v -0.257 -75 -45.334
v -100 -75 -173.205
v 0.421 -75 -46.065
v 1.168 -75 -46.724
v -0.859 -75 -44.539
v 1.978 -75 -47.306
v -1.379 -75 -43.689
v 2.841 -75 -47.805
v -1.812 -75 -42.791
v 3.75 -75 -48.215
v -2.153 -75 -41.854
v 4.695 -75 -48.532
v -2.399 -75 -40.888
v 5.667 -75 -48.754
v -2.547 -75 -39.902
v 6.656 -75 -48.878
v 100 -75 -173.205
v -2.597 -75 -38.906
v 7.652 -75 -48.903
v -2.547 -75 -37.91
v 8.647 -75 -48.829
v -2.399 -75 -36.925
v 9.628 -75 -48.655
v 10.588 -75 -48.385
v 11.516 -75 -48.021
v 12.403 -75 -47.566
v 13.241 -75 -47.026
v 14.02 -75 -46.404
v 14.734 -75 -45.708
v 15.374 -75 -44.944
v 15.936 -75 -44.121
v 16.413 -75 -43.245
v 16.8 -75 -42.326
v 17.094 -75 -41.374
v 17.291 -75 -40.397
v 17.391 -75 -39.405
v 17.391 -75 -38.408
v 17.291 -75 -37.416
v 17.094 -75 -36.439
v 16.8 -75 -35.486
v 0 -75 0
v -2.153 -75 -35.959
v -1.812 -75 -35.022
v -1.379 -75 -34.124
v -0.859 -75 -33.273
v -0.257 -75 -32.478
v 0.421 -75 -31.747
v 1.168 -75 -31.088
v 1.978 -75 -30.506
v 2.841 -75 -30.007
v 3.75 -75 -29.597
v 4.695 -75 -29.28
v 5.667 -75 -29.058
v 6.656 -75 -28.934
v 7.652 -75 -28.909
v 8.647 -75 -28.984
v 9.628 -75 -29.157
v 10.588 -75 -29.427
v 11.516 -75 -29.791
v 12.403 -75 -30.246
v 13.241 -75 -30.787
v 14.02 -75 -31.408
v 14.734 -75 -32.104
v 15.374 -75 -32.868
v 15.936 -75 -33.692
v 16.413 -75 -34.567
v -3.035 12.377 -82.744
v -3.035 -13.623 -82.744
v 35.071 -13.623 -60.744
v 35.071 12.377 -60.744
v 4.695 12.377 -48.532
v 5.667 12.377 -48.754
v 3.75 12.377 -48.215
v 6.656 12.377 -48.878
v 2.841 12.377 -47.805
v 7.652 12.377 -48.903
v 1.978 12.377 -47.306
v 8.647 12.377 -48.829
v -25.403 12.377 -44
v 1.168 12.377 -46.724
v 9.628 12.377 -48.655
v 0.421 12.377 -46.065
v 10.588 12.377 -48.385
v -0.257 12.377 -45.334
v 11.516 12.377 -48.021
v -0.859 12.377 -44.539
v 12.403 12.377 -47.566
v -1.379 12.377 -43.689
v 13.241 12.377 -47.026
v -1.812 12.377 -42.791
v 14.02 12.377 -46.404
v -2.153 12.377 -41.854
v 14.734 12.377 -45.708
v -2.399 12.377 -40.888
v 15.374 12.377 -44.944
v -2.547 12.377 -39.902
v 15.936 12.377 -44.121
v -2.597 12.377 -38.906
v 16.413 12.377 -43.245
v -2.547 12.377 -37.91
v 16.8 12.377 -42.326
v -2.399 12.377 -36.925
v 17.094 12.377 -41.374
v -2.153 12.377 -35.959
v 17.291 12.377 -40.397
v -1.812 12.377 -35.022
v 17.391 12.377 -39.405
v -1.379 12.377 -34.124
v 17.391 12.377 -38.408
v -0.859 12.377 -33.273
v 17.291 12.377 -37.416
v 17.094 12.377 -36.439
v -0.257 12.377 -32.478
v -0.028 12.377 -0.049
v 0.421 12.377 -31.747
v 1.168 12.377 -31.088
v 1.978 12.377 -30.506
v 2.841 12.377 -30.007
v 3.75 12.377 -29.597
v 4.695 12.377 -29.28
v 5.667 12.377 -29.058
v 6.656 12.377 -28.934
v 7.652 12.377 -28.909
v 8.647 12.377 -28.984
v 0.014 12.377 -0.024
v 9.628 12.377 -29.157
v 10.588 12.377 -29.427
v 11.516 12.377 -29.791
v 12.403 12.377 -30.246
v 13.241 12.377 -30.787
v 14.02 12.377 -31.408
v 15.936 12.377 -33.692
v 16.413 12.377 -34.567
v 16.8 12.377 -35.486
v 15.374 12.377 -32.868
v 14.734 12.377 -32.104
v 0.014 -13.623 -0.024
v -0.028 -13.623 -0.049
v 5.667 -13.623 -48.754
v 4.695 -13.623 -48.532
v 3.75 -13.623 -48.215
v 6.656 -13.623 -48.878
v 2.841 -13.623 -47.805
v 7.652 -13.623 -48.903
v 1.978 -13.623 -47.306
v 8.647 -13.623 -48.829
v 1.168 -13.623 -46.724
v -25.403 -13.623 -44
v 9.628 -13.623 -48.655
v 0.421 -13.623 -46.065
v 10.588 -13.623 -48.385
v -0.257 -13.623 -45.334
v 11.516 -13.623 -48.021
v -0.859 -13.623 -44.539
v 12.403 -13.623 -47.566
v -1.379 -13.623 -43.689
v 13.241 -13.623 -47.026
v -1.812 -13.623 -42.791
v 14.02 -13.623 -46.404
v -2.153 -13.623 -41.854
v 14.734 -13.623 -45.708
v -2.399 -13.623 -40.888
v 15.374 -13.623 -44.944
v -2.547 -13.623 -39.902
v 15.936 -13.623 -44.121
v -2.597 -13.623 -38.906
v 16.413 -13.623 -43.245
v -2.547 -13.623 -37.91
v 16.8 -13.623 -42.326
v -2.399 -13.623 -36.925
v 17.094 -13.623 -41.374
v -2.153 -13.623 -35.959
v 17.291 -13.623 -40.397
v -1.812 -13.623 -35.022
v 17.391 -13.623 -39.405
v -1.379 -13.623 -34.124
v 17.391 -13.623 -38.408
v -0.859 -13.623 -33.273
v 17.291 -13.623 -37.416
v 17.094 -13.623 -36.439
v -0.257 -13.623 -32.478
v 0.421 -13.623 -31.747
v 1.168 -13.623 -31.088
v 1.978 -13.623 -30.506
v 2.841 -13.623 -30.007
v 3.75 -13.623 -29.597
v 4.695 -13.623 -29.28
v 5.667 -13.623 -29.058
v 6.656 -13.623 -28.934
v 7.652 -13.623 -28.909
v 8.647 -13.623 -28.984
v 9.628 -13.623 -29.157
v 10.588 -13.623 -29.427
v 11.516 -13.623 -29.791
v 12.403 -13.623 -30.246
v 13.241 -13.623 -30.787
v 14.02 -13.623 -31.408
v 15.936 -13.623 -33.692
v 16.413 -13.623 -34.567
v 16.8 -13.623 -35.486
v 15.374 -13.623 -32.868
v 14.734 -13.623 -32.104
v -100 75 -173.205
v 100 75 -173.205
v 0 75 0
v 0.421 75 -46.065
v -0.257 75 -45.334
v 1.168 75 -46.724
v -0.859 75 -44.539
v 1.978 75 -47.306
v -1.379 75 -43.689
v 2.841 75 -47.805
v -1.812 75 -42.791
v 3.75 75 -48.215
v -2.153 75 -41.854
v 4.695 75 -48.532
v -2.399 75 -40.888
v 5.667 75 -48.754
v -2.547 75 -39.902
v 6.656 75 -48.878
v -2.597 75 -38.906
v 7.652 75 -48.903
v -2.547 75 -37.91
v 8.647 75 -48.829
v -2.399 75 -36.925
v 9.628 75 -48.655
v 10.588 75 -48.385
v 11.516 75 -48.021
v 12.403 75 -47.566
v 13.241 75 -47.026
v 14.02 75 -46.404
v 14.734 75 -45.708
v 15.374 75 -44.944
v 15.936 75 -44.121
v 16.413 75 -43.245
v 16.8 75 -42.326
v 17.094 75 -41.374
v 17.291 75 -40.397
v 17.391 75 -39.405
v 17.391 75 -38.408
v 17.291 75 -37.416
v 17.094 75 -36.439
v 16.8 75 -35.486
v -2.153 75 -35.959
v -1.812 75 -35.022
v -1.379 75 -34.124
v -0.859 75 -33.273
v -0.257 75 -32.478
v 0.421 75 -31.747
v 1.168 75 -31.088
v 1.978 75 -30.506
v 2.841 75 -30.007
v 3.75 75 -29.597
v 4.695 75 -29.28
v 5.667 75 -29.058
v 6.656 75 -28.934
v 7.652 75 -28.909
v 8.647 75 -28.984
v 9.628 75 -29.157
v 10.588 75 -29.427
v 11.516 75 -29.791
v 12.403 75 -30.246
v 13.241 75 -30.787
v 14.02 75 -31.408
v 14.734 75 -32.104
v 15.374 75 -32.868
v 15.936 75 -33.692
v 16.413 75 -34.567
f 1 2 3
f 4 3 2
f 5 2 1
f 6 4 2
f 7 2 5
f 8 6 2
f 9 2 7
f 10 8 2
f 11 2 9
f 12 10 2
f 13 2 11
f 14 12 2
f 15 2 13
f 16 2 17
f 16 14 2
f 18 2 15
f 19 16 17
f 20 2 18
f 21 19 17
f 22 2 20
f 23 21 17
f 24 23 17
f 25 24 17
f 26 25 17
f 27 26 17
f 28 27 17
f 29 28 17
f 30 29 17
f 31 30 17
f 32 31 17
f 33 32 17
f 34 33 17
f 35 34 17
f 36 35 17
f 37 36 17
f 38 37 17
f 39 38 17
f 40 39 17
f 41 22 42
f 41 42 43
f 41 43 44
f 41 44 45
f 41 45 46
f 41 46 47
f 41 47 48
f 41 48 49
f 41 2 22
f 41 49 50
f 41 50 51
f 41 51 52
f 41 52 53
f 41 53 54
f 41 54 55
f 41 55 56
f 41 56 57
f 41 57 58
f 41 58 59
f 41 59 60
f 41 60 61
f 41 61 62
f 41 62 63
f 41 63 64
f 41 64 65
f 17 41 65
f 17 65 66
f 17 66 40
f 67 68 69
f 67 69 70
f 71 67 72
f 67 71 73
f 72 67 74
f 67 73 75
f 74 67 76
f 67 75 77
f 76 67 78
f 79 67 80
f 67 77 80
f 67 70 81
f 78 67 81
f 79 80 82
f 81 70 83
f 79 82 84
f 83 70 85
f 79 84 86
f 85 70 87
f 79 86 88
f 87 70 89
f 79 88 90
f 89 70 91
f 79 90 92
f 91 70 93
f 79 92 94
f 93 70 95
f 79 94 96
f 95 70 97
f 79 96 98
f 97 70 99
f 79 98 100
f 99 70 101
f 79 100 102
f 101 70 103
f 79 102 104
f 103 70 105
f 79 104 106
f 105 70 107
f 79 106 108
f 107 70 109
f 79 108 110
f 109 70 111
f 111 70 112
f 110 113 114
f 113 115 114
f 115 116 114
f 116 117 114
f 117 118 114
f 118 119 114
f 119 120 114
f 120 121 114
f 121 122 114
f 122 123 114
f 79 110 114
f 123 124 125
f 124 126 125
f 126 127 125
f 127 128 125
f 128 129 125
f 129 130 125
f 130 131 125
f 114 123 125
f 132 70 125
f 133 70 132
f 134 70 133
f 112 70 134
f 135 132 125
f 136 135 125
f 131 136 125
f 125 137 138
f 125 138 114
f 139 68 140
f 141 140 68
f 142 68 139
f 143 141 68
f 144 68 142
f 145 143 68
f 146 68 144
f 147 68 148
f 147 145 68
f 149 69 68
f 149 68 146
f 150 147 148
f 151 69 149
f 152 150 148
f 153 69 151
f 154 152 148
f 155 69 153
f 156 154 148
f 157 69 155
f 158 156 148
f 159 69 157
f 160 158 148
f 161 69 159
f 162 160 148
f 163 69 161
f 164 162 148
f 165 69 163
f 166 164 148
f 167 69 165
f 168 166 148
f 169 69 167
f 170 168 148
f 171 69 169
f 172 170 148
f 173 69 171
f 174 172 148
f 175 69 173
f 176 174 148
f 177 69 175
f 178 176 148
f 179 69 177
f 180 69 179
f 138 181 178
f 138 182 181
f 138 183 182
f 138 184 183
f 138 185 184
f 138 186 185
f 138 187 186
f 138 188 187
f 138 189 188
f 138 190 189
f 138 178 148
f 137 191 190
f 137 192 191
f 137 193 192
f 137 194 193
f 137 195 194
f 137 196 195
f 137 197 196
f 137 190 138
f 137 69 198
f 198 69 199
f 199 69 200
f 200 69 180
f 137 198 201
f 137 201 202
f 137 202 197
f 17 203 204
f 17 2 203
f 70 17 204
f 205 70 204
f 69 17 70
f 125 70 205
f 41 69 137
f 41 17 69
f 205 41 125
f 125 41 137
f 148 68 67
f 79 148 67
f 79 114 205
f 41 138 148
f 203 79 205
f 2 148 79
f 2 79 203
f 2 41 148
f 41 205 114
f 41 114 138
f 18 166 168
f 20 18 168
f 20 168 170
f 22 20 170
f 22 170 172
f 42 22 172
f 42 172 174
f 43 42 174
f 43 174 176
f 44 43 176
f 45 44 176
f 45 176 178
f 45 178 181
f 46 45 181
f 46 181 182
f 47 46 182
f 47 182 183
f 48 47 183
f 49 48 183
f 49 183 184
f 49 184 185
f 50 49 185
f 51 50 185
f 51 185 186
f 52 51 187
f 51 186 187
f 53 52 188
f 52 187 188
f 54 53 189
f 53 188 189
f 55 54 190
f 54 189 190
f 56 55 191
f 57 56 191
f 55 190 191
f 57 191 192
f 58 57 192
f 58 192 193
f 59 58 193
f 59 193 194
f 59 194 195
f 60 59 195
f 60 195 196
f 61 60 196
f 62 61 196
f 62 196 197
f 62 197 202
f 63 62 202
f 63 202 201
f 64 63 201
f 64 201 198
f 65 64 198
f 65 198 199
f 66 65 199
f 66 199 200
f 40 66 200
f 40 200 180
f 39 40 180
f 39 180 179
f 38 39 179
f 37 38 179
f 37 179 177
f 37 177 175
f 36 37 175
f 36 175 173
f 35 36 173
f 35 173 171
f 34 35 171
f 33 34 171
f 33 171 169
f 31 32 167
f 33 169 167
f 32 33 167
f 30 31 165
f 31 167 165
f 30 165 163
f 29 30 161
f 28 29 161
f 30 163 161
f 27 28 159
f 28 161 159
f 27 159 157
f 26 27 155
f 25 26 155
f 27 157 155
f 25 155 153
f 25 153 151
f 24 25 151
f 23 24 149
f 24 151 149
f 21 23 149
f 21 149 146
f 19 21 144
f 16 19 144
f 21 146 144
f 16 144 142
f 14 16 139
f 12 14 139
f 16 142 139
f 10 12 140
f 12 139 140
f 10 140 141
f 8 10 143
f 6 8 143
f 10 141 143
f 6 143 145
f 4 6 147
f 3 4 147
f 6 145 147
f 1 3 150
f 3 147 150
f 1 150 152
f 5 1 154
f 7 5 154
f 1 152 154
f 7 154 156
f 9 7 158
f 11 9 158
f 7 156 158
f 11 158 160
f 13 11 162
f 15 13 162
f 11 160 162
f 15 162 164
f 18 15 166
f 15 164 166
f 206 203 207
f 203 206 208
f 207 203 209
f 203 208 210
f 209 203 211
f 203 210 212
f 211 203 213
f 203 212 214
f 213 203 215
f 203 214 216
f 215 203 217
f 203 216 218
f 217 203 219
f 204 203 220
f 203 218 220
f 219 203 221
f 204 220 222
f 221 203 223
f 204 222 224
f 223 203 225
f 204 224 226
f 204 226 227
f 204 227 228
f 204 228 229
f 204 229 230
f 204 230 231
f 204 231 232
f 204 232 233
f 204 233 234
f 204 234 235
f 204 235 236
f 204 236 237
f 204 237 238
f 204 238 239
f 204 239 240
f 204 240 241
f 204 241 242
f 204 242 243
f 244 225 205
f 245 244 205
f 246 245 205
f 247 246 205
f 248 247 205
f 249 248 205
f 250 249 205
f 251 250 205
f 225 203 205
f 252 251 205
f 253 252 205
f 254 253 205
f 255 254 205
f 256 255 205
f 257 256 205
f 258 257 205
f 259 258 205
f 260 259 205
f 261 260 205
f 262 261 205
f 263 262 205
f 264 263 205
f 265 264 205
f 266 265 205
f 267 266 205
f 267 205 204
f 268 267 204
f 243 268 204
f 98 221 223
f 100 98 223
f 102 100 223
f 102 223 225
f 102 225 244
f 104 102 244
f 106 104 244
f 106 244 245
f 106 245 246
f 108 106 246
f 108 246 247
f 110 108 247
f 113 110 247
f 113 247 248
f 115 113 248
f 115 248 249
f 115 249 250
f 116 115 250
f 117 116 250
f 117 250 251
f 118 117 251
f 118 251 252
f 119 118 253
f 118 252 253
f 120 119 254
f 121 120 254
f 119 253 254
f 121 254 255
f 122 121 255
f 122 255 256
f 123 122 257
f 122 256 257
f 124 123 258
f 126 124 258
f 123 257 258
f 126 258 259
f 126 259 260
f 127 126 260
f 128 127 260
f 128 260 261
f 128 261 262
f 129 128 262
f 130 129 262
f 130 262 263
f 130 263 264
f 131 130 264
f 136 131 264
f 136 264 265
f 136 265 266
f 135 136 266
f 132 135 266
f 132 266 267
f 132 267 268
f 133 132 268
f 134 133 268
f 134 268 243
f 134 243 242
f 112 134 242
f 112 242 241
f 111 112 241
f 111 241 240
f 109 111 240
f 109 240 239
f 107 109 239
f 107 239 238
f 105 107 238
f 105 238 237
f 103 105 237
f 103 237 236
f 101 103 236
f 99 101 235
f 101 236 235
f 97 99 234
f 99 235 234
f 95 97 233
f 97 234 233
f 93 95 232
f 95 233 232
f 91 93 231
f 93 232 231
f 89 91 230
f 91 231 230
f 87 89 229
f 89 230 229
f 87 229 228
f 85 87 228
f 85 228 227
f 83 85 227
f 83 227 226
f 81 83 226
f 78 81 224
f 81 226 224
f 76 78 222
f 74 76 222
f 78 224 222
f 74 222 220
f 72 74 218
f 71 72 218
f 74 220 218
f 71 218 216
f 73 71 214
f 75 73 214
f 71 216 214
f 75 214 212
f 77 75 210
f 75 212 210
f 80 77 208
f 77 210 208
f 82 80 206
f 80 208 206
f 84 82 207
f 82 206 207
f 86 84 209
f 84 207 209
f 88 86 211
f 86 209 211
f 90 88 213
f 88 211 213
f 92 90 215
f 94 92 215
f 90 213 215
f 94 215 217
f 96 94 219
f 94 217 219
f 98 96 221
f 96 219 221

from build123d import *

# Parameters (mm, degrees)
F1_DEPTH = 75
F2_R     = 10
F3_DEPTH = 150.001
F4_W     = 26
F4_H     = 70.1128626734
F5_DEPTH = 44


with BuildPart() as f1:
    # F0 (on Front) → F1 (new body, symmetric)
    with BuildSketch(Plane.XZ):
        Polygon((100, -173.2050807569), (0, 0), (-100, -173.2050807569), align=None)
    extrude(amount=F1_DEPTH, both=True)

    # F2 (on face) → F3 (cut, through all)
    with BuildSketch(Plane(origin=(0, 75, 0), x_dir=(-1, 0, 0), z_dir=(0, 1, 0))):
        with Locations((-7.4031245895, -38.9061681926)):
            Circle(F2_R)
    extrude(amount=-F3_DEPTH, mode=Mode.SUBTRACT)

    # F4 (on face) → F5 (cut)
    with BuildSketch(Plane(origin=(0, 0, 0), x_dir=(0, 1, 0), z_dir=(0.8660254038, 0, 0.5))):
        with Locations((-0.6230119616, -35.0847196241)):
            Rectangle(F4_W, F4_H)
    extrude(amount=-F5_DEPTH, mode=Mode.SUBTRACT)


solid = f1.part
